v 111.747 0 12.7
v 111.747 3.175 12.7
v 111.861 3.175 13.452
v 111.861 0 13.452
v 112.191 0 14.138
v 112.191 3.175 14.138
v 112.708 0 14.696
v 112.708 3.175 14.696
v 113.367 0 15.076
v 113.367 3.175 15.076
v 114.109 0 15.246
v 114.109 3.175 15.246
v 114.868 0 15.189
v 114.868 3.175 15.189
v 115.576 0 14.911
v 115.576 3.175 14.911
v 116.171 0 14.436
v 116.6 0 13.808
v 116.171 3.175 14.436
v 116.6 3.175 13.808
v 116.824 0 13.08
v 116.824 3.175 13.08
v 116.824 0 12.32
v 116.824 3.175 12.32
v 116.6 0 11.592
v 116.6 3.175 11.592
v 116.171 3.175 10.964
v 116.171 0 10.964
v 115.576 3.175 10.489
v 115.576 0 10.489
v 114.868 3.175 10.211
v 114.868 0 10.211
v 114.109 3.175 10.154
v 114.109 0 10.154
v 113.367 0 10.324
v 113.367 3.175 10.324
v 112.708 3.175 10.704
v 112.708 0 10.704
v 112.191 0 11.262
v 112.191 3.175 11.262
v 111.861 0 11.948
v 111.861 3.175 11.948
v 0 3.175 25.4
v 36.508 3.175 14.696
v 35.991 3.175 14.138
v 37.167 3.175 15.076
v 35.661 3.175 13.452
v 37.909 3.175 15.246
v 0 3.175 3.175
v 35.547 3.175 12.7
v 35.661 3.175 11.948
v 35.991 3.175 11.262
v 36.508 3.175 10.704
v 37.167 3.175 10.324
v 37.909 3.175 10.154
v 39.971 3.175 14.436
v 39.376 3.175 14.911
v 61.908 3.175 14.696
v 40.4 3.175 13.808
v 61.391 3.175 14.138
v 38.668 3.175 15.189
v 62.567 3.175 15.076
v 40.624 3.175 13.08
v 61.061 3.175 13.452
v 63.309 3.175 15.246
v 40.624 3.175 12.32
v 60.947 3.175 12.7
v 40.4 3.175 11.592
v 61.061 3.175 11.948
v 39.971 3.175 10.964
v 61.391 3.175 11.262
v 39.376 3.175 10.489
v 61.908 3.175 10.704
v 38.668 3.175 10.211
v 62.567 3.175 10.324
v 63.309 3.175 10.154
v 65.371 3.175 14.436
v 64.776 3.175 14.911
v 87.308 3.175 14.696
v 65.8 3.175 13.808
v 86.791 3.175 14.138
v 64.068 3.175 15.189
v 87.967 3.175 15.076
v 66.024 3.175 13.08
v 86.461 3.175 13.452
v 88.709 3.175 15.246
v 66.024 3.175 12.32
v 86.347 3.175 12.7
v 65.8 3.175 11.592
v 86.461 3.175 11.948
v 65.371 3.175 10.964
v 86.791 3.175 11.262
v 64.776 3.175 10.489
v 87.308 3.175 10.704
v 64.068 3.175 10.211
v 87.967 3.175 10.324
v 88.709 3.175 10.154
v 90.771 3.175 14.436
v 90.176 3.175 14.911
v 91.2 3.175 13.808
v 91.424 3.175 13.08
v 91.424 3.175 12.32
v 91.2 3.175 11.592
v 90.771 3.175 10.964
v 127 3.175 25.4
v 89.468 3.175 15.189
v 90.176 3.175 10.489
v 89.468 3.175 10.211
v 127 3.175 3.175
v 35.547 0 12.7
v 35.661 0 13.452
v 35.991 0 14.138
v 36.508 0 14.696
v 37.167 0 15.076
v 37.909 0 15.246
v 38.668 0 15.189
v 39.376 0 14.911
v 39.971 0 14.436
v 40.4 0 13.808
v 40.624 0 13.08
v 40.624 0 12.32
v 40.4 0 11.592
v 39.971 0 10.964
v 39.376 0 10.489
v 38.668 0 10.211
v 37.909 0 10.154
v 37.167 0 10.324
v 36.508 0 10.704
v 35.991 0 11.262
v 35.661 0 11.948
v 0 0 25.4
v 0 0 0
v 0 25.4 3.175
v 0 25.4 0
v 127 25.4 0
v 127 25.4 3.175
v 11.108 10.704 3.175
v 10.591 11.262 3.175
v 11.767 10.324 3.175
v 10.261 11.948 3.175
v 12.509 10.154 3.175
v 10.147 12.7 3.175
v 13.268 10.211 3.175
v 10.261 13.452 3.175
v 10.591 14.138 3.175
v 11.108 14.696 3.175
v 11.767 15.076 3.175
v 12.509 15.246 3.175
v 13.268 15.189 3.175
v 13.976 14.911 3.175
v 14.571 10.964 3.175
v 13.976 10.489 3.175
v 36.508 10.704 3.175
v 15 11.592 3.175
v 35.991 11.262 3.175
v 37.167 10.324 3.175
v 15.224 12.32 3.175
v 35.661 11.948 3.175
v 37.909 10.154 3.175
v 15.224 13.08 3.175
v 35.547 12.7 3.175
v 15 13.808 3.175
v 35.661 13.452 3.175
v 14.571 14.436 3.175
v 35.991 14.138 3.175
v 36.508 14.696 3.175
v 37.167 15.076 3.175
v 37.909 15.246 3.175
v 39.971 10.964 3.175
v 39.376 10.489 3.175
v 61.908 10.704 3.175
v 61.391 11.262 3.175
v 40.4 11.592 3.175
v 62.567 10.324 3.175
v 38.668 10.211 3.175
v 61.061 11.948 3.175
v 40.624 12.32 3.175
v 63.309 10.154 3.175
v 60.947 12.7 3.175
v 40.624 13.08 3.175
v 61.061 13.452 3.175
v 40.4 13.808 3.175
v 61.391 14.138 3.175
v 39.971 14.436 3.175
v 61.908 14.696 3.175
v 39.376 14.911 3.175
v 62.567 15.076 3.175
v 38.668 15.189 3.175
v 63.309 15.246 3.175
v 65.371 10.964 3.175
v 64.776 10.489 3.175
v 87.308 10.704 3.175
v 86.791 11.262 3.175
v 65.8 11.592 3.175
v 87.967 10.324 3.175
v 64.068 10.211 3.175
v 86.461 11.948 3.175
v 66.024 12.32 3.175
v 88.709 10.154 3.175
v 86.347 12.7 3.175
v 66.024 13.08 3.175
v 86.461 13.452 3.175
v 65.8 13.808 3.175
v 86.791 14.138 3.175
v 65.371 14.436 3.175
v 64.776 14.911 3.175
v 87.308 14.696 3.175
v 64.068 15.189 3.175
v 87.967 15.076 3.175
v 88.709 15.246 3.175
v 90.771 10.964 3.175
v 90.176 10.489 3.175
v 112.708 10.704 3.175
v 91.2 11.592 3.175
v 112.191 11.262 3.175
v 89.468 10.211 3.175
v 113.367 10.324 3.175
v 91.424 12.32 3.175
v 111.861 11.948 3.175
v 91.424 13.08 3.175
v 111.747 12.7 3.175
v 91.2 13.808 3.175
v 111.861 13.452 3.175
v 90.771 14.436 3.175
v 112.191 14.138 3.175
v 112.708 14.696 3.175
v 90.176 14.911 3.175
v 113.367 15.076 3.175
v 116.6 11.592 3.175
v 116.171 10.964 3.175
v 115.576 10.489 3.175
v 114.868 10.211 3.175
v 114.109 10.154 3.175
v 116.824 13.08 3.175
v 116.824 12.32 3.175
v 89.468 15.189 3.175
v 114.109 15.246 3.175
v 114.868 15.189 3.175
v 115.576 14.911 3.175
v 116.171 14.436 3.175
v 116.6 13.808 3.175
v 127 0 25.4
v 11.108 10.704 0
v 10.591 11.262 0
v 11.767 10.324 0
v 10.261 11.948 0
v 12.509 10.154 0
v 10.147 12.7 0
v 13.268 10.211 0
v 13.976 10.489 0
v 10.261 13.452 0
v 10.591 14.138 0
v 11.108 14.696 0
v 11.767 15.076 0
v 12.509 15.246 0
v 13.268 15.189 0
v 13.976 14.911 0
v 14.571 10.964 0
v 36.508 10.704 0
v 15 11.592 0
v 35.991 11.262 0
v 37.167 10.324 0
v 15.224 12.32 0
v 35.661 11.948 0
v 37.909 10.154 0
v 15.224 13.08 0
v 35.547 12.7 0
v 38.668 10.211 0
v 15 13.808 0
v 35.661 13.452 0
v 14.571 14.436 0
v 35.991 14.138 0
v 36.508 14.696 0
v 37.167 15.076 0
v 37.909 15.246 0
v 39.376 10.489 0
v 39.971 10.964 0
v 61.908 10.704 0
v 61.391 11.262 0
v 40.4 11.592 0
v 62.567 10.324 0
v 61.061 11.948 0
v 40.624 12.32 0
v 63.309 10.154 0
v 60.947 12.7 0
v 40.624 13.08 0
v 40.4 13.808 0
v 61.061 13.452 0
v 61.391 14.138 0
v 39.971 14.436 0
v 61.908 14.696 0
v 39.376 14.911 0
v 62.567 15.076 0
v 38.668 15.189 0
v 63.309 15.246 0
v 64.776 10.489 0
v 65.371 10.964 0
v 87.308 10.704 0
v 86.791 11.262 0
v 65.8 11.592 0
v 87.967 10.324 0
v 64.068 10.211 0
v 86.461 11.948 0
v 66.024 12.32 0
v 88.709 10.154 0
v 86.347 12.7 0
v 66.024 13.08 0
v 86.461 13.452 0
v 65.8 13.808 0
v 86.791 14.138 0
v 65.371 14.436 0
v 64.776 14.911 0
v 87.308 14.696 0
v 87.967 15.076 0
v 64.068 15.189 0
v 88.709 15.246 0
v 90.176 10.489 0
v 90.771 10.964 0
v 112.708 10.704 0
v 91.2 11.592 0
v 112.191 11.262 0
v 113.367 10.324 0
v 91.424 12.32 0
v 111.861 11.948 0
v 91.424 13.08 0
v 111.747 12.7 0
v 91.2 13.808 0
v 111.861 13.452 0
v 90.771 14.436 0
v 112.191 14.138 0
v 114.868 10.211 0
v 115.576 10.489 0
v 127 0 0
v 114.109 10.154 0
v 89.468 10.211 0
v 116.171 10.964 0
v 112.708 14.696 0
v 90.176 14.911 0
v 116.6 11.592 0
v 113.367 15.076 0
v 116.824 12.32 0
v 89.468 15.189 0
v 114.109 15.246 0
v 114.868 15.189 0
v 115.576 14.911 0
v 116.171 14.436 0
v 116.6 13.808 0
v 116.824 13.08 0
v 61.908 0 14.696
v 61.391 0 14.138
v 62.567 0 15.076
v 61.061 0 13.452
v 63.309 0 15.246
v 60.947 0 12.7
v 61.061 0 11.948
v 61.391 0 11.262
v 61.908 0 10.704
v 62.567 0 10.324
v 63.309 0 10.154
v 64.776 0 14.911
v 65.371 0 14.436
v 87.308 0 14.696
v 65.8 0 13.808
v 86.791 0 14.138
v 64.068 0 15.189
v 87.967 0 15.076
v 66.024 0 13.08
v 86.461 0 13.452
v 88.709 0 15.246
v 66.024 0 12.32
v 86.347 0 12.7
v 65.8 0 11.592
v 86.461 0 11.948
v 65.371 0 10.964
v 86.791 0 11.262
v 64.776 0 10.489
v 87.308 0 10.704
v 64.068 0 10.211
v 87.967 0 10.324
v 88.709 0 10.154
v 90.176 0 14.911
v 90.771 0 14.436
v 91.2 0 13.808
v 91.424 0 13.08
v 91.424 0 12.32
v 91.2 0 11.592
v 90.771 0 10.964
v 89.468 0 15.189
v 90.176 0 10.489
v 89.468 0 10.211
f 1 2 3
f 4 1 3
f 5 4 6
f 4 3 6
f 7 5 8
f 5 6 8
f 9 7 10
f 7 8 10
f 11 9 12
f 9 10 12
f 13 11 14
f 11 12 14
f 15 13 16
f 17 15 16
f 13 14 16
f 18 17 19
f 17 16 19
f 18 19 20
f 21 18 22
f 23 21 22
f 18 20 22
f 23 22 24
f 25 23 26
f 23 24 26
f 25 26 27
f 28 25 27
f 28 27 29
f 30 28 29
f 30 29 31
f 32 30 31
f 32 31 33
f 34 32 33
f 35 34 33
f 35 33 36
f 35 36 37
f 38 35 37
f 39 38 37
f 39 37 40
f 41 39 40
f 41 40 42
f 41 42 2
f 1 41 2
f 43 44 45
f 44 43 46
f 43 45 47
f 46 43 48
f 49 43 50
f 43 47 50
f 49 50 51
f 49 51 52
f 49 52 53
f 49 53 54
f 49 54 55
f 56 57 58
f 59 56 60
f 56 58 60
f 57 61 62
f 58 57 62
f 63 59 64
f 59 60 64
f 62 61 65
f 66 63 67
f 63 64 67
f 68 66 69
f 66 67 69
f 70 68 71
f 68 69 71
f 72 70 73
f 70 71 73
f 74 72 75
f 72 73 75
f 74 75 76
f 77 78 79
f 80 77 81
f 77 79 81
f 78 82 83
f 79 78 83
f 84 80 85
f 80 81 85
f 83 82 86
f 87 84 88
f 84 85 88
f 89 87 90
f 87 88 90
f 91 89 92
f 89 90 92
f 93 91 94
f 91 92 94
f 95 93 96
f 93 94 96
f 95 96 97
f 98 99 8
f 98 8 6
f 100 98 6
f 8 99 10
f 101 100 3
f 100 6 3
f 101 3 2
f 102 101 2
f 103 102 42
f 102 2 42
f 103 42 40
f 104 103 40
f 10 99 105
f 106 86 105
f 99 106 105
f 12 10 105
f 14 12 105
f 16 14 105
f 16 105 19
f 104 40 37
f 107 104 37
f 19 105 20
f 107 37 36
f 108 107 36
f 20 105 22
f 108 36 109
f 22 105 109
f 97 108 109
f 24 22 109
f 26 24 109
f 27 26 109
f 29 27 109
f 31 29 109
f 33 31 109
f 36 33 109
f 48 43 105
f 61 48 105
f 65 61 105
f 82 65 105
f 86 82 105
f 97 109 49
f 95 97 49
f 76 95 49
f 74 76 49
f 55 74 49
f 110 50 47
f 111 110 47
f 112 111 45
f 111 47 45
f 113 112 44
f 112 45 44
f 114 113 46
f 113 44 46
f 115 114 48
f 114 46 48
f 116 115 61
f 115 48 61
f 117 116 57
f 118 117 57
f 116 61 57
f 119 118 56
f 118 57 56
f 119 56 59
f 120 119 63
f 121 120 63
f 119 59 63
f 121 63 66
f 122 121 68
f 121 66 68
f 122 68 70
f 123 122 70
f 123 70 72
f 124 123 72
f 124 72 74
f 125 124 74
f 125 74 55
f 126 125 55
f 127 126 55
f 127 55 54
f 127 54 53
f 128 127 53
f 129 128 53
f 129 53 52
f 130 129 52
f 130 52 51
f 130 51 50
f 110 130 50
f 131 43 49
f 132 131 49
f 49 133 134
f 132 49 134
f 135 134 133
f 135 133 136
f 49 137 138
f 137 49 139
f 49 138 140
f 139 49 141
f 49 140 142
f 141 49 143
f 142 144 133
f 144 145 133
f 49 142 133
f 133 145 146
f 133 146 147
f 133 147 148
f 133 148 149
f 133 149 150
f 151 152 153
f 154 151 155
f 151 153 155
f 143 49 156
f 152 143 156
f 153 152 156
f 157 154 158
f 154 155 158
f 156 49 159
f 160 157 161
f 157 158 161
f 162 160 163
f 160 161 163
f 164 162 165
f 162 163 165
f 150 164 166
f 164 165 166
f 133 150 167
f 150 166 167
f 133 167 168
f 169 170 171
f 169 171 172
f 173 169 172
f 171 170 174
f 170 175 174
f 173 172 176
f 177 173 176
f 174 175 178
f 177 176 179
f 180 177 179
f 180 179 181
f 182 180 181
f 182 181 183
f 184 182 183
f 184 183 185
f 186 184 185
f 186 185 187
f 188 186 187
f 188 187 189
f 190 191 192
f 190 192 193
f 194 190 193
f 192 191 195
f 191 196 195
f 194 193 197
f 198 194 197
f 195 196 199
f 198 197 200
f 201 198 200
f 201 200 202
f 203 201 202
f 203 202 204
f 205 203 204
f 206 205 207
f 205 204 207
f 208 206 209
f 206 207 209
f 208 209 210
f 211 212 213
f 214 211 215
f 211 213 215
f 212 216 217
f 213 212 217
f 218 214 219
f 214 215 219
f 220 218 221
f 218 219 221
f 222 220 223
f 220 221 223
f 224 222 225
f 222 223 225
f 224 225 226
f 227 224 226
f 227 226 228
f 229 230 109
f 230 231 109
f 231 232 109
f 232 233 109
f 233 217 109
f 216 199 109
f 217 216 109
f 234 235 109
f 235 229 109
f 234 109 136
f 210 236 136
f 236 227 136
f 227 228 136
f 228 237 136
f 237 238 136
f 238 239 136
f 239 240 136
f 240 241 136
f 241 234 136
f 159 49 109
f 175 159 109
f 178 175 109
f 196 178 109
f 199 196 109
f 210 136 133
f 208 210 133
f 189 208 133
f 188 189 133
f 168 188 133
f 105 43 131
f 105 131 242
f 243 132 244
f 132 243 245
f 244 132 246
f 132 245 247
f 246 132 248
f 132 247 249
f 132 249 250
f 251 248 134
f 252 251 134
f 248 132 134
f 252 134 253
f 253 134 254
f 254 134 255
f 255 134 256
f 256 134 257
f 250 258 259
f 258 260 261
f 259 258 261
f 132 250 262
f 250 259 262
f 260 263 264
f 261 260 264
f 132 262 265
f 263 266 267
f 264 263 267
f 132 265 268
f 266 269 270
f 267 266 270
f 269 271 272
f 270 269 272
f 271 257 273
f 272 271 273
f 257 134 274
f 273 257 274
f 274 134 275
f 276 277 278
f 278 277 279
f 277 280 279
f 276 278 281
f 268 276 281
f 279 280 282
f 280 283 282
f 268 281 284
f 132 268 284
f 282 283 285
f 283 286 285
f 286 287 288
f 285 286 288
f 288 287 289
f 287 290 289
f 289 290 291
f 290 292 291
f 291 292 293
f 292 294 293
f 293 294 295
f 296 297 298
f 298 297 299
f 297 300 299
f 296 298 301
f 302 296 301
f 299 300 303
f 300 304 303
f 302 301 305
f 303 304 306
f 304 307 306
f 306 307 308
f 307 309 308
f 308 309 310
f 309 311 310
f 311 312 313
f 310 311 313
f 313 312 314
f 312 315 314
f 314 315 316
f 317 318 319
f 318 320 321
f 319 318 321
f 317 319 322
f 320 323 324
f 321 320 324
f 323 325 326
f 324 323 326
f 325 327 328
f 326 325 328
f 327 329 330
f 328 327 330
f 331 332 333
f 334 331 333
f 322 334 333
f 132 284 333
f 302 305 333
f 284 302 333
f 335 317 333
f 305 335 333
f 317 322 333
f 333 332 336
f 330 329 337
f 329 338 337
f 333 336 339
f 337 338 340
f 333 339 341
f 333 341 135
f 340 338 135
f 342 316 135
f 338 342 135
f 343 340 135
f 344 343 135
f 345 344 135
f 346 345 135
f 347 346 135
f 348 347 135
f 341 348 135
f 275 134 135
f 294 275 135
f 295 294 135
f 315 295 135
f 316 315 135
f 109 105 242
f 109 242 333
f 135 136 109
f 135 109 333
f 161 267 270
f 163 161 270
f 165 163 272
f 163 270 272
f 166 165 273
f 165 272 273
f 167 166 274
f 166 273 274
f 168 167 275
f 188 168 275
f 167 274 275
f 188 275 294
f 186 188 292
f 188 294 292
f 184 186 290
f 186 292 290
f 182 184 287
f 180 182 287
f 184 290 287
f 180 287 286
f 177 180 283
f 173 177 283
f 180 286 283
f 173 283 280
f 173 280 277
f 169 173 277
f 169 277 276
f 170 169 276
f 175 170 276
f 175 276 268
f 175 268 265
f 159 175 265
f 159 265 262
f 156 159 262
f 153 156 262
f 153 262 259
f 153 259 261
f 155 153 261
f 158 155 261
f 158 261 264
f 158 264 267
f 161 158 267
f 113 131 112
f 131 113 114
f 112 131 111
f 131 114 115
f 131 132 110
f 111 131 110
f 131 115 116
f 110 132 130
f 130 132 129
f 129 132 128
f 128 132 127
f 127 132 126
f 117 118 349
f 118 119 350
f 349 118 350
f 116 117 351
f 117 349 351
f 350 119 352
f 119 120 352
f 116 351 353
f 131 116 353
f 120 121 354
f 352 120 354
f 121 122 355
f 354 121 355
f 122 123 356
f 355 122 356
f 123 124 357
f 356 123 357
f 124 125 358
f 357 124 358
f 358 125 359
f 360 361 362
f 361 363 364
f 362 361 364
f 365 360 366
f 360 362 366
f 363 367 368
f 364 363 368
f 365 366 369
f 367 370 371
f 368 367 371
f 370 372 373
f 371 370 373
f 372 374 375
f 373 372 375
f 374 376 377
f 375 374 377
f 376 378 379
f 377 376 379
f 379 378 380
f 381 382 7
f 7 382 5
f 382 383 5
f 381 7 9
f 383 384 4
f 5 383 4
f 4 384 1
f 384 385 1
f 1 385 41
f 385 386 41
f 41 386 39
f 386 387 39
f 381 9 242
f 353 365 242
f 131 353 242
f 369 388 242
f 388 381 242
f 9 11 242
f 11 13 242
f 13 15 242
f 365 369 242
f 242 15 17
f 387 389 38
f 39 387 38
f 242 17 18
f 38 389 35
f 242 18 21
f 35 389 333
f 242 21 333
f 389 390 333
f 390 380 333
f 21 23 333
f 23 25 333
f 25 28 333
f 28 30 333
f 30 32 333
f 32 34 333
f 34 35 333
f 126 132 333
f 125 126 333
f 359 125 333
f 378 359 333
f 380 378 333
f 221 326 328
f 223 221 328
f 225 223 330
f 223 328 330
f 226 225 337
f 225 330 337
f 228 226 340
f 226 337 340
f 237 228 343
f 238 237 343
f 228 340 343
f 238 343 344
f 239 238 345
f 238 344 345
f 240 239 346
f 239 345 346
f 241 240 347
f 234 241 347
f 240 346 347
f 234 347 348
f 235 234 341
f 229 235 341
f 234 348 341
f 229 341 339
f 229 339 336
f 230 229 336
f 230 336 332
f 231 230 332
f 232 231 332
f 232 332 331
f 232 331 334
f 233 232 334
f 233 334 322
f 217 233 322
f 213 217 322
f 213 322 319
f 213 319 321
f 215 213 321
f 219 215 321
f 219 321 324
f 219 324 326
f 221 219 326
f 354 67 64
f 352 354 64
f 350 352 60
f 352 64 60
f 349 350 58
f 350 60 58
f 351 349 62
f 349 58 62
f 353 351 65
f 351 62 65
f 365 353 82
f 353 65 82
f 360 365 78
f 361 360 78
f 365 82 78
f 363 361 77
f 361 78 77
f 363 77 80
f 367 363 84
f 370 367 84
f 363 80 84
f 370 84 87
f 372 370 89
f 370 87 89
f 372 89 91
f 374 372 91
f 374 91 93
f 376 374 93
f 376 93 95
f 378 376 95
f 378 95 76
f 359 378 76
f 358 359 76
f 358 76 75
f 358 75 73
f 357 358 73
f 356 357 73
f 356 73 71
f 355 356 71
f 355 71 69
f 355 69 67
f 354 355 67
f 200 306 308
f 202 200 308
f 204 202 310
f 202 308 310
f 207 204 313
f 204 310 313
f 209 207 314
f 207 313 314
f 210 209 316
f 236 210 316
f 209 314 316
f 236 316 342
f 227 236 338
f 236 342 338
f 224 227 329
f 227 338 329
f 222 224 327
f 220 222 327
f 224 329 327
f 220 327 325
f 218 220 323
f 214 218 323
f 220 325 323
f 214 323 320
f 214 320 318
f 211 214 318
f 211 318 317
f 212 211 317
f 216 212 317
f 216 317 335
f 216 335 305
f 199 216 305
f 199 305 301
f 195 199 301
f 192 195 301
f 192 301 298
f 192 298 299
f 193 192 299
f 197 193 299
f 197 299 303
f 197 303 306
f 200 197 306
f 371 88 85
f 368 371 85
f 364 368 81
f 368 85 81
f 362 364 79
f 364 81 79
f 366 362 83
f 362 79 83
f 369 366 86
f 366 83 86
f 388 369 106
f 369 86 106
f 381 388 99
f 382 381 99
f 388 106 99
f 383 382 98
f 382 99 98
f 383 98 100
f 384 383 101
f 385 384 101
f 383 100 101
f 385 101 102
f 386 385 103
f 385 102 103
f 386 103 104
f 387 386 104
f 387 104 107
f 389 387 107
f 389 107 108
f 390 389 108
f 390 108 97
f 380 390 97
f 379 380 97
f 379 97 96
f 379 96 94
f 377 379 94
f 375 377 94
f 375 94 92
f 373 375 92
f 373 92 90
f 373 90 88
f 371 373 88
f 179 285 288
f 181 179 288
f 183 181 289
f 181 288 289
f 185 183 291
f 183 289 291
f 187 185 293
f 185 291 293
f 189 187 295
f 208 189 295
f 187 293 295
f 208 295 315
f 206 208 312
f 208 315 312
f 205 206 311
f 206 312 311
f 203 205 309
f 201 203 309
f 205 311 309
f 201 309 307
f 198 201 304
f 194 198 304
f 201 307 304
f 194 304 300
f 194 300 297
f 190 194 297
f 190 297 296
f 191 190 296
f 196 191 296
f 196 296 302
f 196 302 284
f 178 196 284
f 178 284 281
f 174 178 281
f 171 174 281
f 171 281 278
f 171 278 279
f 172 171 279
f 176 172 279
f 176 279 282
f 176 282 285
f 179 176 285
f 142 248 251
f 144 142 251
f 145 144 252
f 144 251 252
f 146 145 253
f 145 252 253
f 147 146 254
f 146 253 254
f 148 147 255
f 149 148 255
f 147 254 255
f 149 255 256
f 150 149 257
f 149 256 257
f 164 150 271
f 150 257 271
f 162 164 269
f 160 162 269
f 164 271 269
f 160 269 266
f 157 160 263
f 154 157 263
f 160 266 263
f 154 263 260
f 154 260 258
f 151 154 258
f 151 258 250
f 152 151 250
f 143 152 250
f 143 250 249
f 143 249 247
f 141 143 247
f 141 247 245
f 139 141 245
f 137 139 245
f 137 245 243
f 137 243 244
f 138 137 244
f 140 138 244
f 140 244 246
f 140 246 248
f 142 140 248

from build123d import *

# Parameters (mm, degrees)
SKETCH1_W                      = 127
SKETCH1_H                      = 25.4
BOSS_EXTRUDE1_DEPTH            = 25.4
SKETCH2_W                      = 22.225
SKETCH2_H                      = 22.225
CUT_EXTRUDE1_DEPTH             = 132.982271537
F_7_0_201_DIAMETER_HOLE1_D     = 5.1054
F_7_0_201_DIAMETER_HOLE1_DEPTH = 25.4
F_7_0_201_DIAMETER_HOLE2_D     = 5.1054


with BuildPart() as part:
    # Sketch1 → Boss-Extrude1 (new body)
    with BuildSketch(Plane(origin=(0, 25.4, 0), x_dir=(1, 0, 0), z_dir=(0, 1, 0))):
        with Locations((63.5, -12.7)):
            Rectangle(SKETCH1_W, SKETCH1_H)
    extrude(amount=-BOSS_EXTRUDE1_DEPTH)

    # Sketch2 → Cut-Extrude1 (cut, through all)
    with BuildSketch(Plane(origin=(127, 0, 0), x_dir=(0, 0, -1), z_dir=(1, 0, 0))):
        with Locations((-14.2875, 14.2875)):
            Rectangle(SKETCH2_W, SKETCH2_H)
    extrude(amount=-CUT_EXTRUDE1_DEPTH, mode=Mode.SUBTRACT)

    # #7 (0.201) Diameter Hole1
    with Locations(Plane.XZ):
        with Locations((-12.7, -12.7), (38.1, 12.7), (63.5, 12.7), (88.9, 12.7), (114.3, 12.7)):
            Hole(F_7_0_201_DIAMETER_HOLE1_D / 2, depth=F_7_0_201_DIAMETER_HOLE1_DEPTH)

    # #7 (0.201) Diameter Hole2 (through all)
    with Locations(Plane.XY.offset(3.175)):
        with Locations((12.7, 12.7), (38.1, 12.7), (63.5, 12.7), (88.9, 12.7), (114.3, 12.7)):
            Hole(F_7_0_201_DIAMETER_HOLE2_D / 2)


solid = part.part
